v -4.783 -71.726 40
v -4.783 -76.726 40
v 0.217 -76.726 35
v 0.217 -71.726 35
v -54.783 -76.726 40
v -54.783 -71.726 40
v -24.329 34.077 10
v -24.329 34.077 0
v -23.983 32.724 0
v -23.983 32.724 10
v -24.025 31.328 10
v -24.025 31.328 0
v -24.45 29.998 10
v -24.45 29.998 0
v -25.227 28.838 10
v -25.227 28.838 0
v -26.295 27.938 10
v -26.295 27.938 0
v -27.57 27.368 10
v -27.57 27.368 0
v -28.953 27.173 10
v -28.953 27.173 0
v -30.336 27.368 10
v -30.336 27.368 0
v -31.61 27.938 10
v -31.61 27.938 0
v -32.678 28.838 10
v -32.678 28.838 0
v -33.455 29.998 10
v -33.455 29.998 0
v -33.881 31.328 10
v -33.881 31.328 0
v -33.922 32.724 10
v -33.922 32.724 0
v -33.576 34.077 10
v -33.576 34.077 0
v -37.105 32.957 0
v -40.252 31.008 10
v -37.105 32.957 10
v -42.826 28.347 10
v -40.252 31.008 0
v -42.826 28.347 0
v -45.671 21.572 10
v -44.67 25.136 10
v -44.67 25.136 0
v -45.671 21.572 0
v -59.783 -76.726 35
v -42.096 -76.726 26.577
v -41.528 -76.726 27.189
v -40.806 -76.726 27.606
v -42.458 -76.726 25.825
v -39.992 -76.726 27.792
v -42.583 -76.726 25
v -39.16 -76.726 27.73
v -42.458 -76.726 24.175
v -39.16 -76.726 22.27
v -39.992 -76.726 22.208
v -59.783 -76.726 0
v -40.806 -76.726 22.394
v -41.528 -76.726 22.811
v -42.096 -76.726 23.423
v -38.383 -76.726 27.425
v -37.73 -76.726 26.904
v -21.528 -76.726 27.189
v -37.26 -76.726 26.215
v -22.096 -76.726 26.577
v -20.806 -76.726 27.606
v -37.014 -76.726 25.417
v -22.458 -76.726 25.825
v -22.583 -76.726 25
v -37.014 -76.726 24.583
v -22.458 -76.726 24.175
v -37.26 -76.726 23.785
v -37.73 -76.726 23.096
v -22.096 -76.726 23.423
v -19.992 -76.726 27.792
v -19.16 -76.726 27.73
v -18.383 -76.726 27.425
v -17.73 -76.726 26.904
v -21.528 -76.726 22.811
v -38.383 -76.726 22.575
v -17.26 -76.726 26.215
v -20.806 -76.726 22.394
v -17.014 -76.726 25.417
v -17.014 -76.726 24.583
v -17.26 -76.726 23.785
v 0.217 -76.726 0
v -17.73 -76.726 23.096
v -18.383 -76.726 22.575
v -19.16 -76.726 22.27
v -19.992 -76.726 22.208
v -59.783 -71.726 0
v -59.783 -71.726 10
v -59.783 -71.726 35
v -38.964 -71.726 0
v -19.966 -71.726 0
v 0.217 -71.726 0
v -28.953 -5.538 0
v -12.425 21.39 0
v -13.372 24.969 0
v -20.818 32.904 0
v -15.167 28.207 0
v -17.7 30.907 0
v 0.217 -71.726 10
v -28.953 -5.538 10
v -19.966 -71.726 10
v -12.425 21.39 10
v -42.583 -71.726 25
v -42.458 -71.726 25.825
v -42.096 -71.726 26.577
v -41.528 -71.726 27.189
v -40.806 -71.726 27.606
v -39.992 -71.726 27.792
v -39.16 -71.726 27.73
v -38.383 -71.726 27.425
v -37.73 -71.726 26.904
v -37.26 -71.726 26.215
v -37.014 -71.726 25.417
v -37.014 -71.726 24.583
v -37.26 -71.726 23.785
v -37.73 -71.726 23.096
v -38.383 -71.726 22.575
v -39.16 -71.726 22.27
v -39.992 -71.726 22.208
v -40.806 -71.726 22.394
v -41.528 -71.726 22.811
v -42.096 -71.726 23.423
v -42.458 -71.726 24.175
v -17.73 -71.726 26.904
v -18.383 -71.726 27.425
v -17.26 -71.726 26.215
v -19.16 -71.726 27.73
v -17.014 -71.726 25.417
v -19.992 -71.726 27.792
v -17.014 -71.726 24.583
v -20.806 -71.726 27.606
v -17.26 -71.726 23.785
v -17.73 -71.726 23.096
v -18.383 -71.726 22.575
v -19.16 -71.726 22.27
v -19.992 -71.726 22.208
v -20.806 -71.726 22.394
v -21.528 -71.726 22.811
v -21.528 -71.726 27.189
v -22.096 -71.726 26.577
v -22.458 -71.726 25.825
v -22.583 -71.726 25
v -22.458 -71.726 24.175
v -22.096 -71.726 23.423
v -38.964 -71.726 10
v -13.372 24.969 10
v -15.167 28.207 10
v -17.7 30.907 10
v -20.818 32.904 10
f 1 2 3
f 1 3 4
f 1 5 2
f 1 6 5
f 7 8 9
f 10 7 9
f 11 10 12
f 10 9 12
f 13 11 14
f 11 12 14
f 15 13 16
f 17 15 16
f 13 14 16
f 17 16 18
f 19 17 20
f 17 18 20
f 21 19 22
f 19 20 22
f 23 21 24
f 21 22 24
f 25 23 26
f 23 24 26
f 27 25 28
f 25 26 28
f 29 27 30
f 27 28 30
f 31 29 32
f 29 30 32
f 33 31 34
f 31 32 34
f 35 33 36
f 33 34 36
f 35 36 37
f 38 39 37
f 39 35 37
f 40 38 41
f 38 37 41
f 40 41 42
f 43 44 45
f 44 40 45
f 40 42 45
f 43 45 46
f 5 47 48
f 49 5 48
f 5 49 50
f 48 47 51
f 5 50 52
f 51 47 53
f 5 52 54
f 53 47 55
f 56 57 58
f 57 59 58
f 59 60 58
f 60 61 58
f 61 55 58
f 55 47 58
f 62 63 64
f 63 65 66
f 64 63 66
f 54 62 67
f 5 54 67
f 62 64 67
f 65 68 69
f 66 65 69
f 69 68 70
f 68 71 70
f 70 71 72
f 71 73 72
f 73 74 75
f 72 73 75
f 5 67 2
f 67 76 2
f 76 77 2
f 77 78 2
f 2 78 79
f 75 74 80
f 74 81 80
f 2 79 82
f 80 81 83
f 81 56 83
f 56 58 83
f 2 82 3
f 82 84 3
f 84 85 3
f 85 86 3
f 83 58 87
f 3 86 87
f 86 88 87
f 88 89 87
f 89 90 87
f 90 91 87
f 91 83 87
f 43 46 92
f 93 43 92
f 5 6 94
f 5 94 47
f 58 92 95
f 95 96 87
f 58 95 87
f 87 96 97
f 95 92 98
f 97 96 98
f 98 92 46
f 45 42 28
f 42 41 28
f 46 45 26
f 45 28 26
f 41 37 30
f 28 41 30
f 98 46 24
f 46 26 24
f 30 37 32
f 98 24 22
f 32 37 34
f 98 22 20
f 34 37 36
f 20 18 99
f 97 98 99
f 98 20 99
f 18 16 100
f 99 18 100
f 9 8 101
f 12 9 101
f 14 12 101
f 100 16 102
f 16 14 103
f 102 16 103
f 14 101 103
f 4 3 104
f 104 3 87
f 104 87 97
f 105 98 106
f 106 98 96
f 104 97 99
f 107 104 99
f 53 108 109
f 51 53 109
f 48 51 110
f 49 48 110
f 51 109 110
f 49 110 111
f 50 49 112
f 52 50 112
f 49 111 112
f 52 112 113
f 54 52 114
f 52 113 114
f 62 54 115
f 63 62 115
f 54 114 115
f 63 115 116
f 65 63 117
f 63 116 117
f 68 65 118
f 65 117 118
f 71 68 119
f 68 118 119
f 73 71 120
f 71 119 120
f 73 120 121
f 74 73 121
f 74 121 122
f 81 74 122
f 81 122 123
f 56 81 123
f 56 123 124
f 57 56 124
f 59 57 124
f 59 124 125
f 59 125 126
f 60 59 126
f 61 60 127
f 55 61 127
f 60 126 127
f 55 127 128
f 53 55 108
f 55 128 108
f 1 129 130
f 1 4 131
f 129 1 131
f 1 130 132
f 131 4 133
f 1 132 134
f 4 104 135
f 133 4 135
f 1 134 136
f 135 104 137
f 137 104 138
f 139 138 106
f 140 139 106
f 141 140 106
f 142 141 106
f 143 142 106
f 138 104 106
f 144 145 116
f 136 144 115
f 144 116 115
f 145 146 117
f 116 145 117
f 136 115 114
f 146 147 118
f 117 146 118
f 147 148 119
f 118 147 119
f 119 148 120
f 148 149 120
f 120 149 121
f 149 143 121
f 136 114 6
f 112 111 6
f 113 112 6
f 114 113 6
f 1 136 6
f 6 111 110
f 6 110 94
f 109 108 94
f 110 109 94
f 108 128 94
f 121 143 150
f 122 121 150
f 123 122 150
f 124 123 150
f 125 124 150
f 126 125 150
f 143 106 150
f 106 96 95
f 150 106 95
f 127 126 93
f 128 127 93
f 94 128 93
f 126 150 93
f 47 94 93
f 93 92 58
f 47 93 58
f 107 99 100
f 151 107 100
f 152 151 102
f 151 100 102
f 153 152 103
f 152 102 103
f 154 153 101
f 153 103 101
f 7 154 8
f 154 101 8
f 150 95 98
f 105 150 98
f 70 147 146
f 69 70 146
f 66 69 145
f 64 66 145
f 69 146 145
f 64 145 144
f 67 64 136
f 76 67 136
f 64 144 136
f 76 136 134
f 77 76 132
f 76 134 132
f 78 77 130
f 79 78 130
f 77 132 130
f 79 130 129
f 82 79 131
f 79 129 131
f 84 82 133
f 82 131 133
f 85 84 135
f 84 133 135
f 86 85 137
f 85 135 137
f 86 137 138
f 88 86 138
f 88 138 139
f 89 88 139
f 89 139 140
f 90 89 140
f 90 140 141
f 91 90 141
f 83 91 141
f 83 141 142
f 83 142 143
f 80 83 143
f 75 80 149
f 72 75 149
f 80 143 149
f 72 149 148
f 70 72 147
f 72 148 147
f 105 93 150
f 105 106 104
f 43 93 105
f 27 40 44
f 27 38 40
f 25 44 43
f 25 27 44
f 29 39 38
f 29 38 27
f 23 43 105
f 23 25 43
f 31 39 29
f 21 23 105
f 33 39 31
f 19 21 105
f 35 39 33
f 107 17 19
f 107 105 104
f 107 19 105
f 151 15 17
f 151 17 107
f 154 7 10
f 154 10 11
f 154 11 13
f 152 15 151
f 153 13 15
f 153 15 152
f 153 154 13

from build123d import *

# Parameters (mm, degrees)
F1_DEPTH    = 10
F2_DEPTH    = 40
F3_R        = 2.8
F4_DEPTH    = 5
F5_T1_DEPTH = 80.8666856224
F5_T3_DEPTH = 81.0791317508
F6_SIZE     = 5


# Not quite as in the source:
# - a fillet or chamfer that OpenCascade refuses, or shapes differently, is made with other operations: its cross-section is extruded or revolved along the edge and cut away or added


with BuildPart() as f1:
    # F0 (on Top) → F1 (new body)
    with BuildSketch(Plane.XY):
        with BuildLine():
            Line((-43.5517183587, 35.5855710396), (-59.7826302073, -71.725967915))
            Line((-59.7826302073, -71.725967915), (-38.9637436029, -71.725967915))
            Line((-38.9637436029, -71.725967915), (-28.9527400952, -5.5376845384))
            Line((-28.9527400952, -5.5376845384), (-19.966132513, -71.725967915))
            Line((-19.966132513, -71.725967915), (0.2173697927, -71.725967915))
            Line((0.2173697927, -71.725967915), (-14.3378386668, 35.4762497537))
            Line((-14.3378386668, 35.4762497537), (-24.3294449803, 34.076745098))
            ThreePointArc((-24.3294449803, 34.076745098), (-28.9527400952, 27.172764457), (-33.57603521, 34.076745098))
            Line((-33.57603521, 34.076745098), (-43.5517183587, 35.5855710396))
        make_face()
    extrude(amount=F1_DEPTH)

    # F0 (on Top) → F2 (join)
    with BuildSketch(Plane.XY):
        Polygon((-38.9637436029, -71.725967915), (-59.7826302073, -71.725967915), (-59.7826302073, -76.725967915), (0.2173697927, -76.725967915), (0.2173697927, -71.725967915), (-19.966132513, -71.725967915), align=None)
    extrude(amount=F2_DEPTH)

    # F3 (on face) → F4 (cut, through all)
    with BuildSketch(Plane(origin=(0, -71.725967915, 0), x_dir=(-1, 0, 0), z_dir=(0, 1, 0))):
        with Locations((39.7826302073, 25)):
            Circle(F3_R)
        with Locations((19.7826302073, 25)):
            Circle(F3_R)
    extrude(amount=-F4_DEPTH, mode=Mode.SUBTRACT)

    # F5: fillet of radius 15 on 2 edges, made by hand

    # F5_s2 → F5_t1 (cut)
    with BuildSketch(Plane.XY.offset(-35.4333428112)):
        with BuildLine():
            ThreePointArc((-33.57603521, 34.076745098), (-41.6218227772, 29.7568391026), (-45.6713333114, 21.5716237836))
            Line((-45.6713333114, 21.5716237836), (-43.5517183587, 35.5855710396))
            Line((-43.5517183587, 35.5855710396), (-33.57603521, 34.076745098))
        make_face()
    extrude(amount=F5_T1_DEPTH, mode=Mode.SUBTRACT)

    # F5_s4 → F5_t3 (cut)
    with BuildSketch(Plane.XY.offset(-35.5395658754)):
        with BuildLine():
            ThreePointArc((-12.4252559054, 21.3896694023), (-16.3501492828, 29.6353150708), (-24.3294449803, 34.076745098))
            Line((-24.3294449803, 34.076745098), (-14.3378386668, 35.4762497537))
            Line((-14.3378386668, 35.4762497537), (-12.4252559054, 21.3896694023))
        make_face()
    extrude(amount=F5_T3_DEPTH, mode=Mode.SUBTRACT)

    # F6
    f6_edges = [f1.edges().sort_by_distance(p)[0] for p in [
        (0.21737, -74.225968, 40),
        (-59.78263, -74.225968, 40),
    ]]
    chamfer(f6_edges, length=F6_SIZE)


solid = f1.part
